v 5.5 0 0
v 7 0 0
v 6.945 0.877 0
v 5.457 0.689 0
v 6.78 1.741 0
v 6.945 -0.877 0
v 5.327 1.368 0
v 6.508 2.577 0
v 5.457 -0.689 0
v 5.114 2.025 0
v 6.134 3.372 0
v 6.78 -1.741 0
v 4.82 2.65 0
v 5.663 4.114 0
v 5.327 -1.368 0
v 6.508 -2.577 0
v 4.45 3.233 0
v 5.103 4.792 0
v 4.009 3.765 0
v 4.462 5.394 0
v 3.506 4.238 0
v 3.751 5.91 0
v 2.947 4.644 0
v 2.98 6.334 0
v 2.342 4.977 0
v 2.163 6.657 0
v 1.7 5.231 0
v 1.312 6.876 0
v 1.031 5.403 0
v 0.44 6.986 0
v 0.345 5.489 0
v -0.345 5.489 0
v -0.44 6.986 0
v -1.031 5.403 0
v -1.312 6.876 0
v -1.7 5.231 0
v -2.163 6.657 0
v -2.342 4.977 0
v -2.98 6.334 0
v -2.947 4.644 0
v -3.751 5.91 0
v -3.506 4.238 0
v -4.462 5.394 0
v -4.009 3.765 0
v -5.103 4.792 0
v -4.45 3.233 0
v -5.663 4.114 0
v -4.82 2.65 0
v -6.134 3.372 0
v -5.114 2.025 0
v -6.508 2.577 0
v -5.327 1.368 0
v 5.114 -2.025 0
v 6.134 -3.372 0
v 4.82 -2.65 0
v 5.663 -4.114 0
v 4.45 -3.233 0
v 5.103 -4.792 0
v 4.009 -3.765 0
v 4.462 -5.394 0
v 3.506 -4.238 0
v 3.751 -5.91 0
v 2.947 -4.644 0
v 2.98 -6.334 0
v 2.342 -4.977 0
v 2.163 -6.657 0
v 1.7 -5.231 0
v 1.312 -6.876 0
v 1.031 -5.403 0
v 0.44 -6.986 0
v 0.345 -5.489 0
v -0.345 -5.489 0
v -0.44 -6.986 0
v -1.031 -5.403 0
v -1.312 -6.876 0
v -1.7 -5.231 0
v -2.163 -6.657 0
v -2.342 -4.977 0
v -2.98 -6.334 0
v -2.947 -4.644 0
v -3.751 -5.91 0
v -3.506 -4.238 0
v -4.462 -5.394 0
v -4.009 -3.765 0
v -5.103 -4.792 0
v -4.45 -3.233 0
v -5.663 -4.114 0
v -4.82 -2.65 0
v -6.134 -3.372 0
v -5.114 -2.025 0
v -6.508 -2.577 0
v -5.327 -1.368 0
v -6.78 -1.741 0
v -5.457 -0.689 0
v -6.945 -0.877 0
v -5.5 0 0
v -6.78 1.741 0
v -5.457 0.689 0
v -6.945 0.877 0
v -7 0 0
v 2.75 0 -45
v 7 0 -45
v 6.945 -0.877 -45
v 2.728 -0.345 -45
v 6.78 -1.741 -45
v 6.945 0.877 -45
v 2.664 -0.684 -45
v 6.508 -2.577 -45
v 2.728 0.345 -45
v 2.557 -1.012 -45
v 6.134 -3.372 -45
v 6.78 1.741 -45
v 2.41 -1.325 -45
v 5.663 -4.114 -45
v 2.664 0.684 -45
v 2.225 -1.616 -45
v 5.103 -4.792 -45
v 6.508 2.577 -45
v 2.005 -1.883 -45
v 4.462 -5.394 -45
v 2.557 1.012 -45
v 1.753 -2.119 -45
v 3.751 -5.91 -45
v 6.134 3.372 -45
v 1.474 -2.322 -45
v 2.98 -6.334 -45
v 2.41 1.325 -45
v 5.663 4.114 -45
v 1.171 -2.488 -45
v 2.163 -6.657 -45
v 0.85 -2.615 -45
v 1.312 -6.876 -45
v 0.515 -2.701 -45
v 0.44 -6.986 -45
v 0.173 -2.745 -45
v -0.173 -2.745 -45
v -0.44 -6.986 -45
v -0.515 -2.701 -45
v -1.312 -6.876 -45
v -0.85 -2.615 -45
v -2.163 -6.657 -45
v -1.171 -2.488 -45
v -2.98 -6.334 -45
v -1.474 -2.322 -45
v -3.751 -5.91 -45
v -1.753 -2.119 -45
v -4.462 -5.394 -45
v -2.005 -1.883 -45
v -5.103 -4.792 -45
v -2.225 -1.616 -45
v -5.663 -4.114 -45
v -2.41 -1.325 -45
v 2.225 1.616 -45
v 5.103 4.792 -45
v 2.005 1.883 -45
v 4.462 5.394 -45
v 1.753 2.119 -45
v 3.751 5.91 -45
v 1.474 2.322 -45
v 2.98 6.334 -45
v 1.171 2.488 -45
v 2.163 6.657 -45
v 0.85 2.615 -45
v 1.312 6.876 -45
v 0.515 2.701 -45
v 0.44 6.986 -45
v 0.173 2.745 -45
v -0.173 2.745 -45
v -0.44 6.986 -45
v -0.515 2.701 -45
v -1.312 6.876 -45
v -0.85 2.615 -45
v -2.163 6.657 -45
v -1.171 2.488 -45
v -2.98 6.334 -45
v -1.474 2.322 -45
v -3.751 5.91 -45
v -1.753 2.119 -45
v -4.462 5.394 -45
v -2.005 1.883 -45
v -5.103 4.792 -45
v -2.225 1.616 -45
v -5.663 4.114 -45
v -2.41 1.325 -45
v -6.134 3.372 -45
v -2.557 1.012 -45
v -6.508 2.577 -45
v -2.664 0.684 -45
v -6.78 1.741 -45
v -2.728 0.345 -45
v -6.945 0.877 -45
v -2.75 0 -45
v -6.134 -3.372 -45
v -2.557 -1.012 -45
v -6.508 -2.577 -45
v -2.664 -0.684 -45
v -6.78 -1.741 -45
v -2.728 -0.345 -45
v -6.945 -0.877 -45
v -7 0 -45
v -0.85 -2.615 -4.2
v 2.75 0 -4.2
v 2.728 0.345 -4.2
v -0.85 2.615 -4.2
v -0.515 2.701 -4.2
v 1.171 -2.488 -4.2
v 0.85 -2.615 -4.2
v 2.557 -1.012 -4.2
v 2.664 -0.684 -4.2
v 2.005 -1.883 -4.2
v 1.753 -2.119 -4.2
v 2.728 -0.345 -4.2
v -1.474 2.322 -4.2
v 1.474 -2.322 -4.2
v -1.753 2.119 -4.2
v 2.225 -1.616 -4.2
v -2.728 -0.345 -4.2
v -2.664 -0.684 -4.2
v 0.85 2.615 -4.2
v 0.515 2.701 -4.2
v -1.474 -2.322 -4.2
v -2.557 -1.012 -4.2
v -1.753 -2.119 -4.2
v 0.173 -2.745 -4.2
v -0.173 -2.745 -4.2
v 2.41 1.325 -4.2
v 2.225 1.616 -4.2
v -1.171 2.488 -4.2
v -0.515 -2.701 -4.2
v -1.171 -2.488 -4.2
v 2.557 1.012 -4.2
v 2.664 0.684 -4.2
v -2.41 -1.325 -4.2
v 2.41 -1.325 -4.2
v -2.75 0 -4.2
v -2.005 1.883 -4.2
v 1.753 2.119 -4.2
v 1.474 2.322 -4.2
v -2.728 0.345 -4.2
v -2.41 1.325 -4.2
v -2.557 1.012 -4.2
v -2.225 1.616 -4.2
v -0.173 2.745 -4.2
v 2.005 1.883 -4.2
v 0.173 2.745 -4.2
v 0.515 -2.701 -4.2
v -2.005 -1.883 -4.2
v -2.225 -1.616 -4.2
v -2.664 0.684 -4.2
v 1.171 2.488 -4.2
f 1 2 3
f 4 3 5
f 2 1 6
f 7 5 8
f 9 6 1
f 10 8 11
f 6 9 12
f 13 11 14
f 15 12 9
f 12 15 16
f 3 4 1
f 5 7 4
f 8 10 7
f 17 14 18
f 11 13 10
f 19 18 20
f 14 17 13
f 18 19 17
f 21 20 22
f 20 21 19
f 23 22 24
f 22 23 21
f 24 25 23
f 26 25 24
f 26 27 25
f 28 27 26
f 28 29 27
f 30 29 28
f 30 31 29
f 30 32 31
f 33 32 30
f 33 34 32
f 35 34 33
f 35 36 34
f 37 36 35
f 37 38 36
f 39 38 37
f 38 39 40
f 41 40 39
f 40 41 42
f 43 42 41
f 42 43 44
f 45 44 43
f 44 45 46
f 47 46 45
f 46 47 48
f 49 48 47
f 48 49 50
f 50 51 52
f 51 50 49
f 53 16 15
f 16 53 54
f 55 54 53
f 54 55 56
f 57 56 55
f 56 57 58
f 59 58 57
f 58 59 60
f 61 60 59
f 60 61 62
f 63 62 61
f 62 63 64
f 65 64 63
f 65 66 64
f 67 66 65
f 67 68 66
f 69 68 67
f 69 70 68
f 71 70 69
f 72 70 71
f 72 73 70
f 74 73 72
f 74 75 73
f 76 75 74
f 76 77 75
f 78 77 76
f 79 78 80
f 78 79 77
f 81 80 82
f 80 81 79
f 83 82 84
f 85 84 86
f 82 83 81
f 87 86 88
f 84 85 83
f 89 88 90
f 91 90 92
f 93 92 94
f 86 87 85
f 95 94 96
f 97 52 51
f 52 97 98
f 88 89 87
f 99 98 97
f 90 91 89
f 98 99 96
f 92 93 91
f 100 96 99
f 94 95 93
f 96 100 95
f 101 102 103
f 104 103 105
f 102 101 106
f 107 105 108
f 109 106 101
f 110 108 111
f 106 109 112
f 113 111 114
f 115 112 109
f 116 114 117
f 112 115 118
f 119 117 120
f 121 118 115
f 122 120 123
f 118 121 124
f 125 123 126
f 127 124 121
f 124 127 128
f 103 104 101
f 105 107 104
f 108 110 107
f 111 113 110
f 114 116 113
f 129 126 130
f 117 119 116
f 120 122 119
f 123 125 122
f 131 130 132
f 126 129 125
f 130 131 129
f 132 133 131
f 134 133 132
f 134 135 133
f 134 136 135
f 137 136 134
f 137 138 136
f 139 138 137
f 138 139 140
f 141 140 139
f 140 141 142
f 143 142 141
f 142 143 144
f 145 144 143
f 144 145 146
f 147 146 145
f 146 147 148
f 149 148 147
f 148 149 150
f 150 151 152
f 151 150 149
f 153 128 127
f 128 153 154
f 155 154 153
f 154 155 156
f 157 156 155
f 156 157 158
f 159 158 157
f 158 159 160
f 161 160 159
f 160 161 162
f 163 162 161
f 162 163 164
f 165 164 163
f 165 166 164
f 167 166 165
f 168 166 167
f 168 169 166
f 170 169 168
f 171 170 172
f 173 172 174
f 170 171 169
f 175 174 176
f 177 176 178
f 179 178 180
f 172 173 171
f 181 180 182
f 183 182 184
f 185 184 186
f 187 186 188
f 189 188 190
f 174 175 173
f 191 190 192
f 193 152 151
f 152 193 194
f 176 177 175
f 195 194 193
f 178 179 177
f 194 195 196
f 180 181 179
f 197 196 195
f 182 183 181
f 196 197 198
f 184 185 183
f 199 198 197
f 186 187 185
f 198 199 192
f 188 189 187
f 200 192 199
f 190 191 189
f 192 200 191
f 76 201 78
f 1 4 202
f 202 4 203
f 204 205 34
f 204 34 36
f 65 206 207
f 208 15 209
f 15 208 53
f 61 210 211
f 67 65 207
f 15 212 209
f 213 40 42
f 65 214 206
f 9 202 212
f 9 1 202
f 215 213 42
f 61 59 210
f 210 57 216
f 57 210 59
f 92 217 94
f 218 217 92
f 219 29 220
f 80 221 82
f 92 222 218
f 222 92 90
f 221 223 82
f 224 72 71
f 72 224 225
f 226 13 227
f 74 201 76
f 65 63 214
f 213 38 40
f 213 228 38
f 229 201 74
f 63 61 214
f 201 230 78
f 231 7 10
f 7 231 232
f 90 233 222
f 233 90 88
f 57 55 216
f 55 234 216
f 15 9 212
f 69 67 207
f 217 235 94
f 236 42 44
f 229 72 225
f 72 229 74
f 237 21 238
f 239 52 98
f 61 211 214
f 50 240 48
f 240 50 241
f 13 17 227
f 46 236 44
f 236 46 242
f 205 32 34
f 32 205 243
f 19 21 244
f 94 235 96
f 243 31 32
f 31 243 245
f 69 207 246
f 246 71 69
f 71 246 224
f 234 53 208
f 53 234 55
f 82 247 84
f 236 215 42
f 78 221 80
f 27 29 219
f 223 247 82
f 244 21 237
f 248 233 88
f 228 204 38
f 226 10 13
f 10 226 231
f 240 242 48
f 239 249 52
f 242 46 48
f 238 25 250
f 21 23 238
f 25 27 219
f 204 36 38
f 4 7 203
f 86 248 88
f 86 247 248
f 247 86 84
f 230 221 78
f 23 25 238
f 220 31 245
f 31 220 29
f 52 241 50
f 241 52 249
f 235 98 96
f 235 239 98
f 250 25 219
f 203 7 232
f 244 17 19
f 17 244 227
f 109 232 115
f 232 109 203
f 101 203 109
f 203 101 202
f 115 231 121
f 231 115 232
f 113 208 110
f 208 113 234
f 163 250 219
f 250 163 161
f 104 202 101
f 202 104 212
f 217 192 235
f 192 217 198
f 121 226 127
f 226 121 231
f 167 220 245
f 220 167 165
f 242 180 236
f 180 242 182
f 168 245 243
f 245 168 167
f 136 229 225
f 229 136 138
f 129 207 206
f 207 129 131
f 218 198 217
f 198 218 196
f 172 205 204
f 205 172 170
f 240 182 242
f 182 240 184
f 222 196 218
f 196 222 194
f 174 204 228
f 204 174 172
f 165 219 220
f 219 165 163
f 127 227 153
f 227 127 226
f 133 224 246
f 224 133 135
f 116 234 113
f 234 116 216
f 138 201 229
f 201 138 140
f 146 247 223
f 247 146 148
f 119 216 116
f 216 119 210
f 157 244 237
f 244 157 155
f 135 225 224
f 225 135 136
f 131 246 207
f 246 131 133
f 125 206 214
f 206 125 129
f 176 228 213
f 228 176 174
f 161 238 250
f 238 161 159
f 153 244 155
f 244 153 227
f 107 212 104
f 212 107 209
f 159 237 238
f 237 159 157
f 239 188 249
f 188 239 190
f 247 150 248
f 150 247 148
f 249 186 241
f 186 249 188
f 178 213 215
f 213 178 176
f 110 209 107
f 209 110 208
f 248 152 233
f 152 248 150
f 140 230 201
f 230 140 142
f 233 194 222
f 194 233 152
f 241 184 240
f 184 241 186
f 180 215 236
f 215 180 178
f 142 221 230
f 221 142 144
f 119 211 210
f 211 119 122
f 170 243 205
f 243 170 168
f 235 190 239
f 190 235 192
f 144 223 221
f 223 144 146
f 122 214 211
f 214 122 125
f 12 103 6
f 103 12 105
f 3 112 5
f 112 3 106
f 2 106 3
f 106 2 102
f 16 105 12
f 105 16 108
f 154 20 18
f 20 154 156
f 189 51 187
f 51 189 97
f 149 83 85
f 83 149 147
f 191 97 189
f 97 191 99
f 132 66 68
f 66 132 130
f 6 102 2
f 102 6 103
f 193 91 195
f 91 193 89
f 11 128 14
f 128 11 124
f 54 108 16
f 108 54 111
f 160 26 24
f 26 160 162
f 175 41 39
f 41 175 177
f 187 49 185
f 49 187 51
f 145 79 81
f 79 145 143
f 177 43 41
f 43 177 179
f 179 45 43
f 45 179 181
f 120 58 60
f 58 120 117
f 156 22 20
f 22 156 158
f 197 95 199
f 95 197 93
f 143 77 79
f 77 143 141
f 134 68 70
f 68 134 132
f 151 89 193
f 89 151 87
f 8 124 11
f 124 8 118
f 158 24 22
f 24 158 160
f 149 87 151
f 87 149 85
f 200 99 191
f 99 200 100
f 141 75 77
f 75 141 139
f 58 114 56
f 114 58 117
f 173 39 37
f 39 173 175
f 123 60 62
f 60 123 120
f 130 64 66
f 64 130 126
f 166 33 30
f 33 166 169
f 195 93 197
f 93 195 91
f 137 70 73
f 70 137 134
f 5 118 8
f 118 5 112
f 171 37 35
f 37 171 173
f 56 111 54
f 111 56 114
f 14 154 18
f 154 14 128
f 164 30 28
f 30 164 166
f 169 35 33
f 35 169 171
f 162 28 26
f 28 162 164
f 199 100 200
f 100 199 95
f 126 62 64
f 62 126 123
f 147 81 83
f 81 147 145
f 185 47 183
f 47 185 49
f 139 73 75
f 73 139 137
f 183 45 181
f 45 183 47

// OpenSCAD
$fn = 50;


difference() {
	union() {
		translate(v = [0, 0, -45.0000000000]) {
			cylinder(h = 45, r = 7.0000000000);
		}
		cylinder(h = 0, r = 16.0000000000);
	}
	union() {
		translate(v = [0, 0, 0]) {
			rotate(a = [0, 0, 0]) {
				difference() {
					union() {
						#translate(v = [0, 0, -45.0000000000]) {
							cylinder(h = 45, r = 2.2500000000);
						}
						#translate(v = [0, 0, -4.2000000000]) {
							cylinder(h = 4.2000000000, r = 7.0000000000, r1 = 2.7500000000, r2 = 5.5000000000);
						}
						#translate(v = [0, 0, -45.0000000000]) {
							cylinder(h = 45, r = 2.7500000000);
						}
						#translate(v = [0, 0, -45.0000000000]) {
							cylinder(h = 45, r = 2.2500000000);
						}
					}
					union();
				}
			}
		}
	}
}
